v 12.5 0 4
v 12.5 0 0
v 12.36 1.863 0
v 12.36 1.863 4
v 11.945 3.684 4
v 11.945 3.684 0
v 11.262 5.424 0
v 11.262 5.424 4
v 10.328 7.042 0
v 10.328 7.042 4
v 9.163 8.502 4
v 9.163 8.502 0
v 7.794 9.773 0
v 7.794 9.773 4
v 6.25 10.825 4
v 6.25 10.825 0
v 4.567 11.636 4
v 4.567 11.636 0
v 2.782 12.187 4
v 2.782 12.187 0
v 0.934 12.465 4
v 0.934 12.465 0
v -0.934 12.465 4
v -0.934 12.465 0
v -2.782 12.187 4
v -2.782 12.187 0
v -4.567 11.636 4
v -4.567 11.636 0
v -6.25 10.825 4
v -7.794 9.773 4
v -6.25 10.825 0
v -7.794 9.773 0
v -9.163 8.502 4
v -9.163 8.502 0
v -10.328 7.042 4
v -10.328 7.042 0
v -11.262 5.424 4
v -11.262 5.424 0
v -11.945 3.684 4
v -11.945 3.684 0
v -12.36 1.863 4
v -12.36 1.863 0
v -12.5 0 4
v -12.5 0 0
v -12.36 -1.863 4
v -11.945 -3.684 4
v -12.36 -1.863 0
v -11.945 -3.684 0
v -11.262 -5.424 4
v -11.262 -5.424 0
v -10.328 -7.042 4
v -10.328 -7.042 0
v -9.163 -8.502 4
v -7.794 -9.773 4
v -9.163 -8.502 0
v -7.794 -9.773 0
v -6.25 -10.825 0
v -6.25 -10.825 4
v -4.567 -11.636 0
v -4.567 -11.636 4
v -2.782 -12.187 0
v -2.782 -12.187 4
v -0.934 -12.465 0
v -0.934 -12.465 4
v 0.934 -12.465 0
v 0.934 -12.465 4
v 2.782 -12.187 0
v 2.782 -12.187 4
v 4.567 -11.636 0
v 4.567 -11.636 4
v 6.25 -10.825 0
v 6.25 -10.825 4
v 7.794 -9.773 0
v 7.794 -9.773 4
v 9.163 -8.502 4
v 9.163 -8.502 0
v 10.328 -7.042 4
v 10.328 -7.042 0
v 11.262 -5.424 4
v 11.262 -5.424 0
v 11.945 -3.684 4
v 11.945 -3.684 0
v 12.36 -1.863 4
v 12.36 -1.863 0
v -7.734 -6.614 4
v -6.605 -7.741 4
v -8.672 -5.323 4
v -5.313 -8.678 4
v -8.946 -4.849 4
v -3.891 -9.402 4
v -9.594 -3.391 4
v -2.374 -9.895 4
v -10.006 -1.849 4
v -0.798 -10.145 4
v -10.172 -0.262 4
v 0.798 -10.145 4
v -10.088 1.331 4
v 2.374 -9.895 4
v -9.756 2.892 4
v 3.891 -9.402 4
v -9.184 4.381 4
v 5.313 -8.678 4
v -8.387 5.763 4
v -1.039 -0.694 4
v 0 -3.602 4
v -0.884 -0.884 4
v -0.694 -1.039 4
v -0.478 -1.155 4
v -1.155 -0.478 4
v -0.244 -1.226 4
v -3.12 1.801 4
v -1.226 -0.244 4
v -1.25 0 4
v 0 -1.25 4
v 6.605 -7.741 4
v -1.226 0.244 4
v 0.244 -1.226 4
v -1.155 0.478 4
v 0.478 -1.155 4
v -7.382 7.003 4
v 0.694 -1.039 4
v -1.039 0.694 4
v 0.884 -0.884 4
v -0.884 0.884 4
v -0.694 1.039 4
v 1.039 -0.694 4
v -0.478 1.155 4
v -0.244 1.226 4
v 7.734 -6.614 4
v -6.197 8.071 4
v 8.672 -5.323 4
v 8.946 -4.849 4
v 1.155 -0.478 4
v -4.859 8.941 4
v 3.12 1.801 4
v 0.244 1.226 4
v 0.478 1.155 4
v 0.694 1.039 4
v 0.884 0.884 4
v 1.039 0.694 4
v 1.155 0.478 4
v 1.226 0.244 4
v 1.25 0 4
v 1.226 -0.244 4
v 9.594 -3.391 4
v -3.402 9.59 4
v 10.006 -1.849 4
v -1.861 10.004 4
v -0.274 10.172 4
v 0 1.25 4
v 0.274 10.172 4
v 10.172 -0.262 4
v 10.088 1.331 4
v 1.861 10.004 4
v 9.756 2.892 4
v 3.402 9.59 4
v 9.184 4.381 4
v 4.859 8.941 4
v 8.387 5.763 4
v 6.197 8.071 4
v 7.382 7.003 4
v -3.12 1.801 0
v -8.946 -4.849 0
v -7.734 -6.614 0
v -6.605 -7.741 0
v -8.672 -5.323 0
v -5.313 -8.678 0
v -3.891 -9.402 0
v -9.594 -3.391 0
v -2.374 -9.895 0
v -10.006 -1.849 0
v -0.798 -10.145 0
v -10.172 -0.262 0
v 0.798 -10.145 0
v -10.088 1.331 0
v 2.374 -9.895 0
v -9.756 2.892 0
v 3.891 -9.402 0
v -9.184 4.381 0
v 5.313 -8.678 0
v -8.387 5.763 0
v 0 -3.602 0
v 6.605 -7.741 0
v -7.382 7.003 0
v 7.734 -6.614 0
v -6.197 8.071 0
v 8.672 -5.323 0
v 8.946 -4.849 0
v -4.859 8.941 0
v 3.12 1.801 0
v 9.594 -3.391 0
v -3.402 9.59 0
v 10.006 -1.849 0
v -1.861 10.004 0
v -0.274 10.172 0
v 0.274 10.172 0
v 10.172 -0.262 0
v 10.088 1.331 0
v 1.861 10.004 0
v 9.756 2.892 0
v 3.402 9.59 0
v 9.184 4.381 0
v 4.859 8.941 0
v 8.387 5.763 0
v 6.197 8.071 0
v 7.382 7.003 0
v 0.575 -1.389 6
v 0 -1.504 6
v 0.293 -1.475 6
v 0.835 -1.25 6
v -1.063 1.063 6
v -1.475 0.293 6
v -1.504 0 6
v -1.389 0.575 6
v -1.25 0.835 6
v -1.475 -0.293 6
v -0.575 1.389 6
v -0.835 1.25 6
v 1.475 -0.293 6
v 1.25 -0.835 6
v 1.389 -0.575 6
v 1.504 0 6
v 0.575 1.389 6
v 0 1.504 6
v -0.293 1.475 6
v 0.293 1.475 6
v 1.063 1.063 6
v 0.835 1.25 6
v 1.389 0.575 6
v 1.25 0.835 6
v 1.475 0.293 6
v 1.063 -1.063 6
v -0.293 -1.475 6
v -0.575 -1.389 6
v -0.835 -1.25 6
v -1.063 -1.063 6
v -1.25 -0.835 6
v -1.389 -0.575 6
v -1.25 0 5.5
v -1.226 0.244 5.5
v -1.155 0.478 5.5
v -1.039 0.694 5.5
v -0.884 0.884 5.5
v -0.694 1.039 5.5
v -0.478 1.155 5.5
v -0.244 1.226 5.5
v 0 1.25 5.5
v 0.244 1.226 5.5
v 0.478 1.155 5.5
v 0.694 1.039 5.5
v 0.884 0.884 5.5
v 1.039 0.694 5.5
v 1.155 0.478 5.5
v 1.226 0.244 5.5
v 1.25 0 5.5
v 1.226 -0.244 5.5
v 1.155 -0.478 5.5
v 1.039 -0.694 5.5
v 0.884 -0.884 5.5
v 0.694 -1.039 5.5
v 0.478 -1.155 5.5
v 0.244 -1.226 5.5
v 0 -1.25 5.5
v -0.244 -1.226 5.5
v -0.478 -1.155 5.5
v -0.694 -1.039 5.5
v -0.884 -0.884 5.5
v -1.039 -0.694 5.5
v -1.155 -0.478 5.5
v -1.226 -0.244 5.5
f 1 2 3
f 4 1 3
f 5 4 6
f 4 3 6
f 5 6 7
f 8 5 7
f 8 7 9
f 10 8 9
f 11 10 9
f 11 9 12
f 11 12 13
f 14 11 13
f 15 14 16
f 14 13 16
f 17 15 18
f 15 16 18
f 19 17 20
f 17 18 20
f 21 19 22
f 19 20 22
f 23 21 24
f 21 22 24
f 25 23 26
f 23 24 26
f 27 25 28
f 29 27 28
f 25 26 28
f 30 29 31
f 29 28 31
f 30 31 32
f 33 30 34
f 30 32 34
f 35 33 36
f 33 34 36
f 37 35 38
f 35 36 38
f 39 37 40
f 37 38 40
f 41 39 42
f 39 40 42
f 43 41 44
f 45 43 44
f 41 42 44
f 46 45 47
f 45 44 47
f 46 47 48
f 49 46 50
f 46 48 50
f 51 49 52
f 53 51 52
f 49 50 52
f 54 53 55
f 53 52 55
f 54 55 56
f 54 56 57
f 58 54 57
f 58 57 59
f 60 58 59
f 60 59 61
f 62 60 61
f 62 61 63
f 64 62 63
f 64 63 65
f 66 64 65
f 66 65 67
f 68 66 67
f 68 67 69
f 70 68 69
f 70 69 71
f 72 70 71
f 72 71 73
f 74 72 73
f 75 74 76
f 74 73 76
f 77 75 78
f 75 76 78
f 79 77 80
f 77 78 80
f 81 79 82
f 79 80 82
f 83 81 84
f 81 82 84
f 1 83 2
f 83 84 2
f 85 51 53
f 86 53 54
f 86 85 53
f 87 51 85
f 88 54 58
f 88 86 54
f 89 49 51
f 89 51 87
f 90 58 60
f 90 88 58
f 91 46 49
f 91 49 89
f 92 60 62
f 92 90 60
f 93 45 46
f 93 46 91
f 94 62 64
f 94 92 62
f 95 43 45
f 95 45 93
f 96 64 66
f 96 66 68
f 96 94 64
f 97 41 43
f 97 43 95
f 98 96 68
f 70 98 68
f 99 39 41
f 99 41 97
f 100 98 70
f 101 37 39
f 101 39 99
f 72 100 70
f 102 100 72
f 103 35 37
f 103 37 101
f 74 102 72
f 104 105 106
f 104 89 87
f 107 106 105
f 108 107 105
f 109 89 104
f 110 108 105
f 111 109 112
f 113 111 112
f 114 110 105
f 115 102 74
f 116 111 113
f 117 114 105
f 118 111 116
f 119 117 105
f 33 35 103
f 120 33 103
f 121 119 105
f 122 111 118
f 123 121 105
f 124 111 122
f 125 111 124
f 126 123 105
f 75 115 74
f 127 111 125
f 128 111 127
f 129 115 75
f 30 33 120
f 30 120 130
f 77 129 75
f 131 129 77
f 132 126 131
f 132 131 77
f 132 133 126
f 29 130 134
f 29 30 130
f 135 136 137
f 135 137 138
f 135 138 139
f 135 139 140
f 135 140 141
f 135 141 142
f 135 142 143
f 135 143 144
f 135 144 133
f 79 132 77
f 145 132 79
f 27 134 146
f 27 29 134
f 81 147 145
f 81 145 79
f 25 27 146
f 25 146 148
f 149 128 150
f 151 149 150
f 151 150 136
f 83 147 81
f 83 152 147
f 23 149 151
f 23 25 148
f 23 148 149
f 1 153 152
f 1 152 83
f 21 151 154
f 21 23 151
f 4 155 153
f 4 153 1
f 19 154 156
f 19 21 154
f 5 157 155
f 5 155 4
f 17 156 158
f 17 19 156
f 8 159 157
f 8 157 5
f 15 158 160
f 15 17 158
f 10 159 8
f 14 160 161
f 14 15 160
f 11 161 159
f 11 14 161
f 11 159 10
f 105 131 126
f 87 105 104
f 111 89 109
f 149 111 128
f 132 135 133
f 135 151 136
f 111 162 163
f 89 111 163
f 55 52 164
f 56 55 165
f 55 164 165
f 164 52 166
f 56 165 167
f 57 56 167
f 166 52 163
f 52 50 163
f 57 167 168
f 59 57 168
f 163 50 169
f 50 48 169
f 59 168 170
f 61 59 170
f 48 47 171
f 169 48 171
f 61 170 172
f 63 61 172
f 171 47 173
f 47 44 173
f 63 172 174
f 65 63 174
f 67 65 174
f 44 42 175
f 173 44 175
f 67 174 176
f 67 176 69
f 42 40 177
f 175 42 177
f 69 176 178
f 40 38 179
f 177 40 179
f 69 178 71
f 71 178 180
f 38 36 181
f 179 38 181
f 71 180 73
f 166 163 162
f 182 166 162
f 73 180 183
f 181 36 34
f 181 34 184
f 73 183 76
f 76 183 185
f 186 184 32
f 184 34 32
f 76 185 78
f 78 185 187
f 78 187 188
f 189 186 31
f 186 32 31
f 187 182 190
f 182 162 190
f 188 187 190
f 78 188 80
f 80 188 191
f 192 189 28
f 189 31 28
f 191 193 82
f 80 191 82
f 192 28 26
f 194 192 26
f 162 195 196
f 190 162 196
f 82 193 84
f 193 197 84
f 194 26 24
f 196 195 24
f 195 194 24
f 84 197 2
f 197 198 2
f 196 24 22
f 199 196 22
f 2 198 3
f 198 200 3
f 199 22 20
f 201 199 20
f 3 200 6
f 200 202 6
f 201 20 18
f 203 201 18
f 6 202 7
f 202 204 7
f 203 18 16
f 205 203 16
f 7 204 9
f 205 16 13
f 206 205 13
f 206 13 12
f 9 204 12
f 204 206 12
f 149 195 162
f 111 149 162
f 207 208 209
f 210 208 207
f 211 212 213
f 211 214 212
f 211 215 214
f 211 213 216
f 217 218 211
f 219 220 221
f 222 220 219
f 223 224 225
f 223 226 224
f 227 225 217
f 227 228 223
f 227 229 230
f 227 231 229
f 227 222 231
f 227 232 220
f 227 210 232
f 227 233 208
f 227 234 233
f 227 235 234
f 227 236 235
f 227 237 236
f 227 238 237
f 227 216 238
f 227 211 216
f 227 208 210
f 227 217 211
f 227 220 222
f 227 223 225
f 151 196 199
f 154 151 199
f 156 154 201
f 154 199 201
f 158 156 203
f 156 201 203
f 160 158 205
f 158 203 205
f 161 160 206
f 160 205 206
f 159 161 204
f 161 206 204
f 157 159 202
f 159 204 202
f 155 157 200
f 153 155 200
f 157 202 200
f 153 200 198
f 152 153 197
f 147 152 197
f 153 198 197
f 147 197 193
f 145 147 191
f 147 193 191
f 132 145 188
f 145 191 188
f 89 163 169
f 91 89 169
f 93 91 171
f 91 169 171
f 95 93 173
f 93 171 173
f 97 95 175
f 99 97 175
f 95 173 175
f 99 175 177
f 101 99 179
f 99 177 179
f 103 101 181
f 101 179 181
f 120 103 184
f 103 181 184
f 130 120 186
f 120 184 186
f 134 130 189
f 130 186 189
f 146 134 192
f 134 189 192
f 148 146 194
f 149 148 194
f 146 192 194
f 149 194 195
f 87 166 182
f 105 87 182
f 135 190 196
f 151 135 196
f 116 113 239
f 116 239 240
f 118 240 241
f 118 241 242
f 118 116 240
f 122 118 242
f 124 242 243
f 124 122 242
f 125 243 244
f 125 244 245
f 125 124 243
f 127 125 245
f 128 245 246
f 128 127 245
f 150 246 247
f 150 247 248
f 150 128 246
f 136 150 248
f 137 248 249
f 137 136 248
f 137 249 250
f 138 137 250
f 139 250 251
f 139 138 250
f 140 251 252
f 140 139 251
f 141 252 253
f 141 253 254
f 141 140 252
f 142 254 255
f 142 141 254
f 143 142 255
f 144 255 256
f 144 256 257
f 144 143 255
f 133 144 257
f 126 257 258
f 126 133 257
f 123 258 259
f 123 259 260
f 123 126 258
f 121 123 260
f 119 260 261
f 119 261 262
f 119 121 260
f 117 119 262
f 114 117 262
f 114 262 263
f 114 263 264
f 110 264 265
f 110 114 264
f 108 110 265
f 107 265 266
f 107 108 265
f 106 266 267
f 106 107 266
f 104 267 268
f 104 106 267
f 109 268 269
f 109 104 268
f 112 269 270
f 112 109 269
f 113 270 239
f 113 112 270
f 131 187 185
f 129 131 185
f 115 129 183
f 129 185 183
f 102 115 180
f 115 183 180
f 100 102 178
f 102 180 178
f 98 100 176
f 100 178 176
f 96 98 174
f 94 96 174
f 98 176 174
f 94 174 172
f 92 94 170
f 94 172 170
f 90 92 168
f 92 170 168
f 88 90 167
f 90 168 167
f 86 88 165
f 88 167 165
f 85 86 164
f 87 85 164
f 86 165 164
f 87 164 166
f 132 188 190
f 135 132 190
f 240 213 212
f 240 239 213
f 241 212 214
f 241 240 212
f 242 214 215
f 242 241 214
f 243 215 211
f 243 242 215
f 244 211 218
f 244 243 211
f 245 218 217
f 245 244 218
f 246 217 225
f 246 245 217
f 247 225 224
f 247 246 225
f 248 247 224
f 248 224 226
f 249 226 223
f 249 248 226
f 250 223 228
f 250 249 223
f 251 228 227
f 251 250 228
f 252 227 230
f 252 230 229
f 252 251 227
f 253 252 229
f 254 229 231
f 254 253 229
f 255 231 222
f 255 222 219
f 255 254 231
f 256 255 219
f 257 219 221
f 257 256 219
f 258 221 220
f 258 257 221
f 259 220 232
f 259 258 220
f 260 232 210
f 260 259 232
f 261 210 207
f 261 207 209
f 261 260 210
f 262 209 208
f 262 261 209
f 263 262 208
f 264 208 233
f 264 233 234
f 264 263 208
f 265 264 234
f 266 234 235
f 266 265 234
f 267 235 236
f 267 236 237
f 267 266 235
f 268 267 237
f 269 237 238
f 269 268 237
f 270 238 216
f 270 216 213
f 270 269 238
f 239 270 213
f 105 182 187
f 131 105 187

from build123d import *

# Parameters (mm, degrees)
F0_R     = 12.5
F1_DEPTH = 4


with BuildPart() as f1:
    # F0 (on Top) → F1 (new body)
    with BuildSketch(Plane.XY):
        Circle(F0_R)
        with BuildLine():
            ThreePointArc((8.672397, -5.323291), (0, -10.175849), (-8.672397, -5.323291))
            Line((-8.672397, -5.323291), (0, -3.602296))
            Line((0, -3.602296), (8.672397, -5.323291))
        make_face(mode=Mode.SUBTRACT)
        with BuildLine():
            ThreePointArc((-8.946304, -4.848871), (-8.812543, 5.087924), (-0.273907, 10.172161))
            Line((-0.273907, 10.172161), (-3.11968, 1.801148))
            Line((-3.11968, 1.801148), (-8.946304, -4.848871))
        make_face(mode=Mode.SUBTRACT)
        with BuildLine():
            Line((3.11968, 1.801148), (0.273907, 10.172161))
            ThreePointArc((0.273907, 10.172161), (8.812543, 5.087924), (8.946304, -4.848871))
            Line((8.946304, -4.848871), (3.11968, 1.801148))
        make_face(mode=Mode.SUBTRACT)
    extrude(amount=F1_DEPTH)

    # F2 (on Front) → F3 (revolve)
    with BuildSketch(Plane.XZ):
        Polygon((-1.25, 5.5), (-1.25, 3.62873), (0, 2.650845), (0, 6), (-1.503677, 6), align=None)
    revolve(axis=Axis((0, 0, 4.325422), (0, 0, -1)))


solid = f1.part
